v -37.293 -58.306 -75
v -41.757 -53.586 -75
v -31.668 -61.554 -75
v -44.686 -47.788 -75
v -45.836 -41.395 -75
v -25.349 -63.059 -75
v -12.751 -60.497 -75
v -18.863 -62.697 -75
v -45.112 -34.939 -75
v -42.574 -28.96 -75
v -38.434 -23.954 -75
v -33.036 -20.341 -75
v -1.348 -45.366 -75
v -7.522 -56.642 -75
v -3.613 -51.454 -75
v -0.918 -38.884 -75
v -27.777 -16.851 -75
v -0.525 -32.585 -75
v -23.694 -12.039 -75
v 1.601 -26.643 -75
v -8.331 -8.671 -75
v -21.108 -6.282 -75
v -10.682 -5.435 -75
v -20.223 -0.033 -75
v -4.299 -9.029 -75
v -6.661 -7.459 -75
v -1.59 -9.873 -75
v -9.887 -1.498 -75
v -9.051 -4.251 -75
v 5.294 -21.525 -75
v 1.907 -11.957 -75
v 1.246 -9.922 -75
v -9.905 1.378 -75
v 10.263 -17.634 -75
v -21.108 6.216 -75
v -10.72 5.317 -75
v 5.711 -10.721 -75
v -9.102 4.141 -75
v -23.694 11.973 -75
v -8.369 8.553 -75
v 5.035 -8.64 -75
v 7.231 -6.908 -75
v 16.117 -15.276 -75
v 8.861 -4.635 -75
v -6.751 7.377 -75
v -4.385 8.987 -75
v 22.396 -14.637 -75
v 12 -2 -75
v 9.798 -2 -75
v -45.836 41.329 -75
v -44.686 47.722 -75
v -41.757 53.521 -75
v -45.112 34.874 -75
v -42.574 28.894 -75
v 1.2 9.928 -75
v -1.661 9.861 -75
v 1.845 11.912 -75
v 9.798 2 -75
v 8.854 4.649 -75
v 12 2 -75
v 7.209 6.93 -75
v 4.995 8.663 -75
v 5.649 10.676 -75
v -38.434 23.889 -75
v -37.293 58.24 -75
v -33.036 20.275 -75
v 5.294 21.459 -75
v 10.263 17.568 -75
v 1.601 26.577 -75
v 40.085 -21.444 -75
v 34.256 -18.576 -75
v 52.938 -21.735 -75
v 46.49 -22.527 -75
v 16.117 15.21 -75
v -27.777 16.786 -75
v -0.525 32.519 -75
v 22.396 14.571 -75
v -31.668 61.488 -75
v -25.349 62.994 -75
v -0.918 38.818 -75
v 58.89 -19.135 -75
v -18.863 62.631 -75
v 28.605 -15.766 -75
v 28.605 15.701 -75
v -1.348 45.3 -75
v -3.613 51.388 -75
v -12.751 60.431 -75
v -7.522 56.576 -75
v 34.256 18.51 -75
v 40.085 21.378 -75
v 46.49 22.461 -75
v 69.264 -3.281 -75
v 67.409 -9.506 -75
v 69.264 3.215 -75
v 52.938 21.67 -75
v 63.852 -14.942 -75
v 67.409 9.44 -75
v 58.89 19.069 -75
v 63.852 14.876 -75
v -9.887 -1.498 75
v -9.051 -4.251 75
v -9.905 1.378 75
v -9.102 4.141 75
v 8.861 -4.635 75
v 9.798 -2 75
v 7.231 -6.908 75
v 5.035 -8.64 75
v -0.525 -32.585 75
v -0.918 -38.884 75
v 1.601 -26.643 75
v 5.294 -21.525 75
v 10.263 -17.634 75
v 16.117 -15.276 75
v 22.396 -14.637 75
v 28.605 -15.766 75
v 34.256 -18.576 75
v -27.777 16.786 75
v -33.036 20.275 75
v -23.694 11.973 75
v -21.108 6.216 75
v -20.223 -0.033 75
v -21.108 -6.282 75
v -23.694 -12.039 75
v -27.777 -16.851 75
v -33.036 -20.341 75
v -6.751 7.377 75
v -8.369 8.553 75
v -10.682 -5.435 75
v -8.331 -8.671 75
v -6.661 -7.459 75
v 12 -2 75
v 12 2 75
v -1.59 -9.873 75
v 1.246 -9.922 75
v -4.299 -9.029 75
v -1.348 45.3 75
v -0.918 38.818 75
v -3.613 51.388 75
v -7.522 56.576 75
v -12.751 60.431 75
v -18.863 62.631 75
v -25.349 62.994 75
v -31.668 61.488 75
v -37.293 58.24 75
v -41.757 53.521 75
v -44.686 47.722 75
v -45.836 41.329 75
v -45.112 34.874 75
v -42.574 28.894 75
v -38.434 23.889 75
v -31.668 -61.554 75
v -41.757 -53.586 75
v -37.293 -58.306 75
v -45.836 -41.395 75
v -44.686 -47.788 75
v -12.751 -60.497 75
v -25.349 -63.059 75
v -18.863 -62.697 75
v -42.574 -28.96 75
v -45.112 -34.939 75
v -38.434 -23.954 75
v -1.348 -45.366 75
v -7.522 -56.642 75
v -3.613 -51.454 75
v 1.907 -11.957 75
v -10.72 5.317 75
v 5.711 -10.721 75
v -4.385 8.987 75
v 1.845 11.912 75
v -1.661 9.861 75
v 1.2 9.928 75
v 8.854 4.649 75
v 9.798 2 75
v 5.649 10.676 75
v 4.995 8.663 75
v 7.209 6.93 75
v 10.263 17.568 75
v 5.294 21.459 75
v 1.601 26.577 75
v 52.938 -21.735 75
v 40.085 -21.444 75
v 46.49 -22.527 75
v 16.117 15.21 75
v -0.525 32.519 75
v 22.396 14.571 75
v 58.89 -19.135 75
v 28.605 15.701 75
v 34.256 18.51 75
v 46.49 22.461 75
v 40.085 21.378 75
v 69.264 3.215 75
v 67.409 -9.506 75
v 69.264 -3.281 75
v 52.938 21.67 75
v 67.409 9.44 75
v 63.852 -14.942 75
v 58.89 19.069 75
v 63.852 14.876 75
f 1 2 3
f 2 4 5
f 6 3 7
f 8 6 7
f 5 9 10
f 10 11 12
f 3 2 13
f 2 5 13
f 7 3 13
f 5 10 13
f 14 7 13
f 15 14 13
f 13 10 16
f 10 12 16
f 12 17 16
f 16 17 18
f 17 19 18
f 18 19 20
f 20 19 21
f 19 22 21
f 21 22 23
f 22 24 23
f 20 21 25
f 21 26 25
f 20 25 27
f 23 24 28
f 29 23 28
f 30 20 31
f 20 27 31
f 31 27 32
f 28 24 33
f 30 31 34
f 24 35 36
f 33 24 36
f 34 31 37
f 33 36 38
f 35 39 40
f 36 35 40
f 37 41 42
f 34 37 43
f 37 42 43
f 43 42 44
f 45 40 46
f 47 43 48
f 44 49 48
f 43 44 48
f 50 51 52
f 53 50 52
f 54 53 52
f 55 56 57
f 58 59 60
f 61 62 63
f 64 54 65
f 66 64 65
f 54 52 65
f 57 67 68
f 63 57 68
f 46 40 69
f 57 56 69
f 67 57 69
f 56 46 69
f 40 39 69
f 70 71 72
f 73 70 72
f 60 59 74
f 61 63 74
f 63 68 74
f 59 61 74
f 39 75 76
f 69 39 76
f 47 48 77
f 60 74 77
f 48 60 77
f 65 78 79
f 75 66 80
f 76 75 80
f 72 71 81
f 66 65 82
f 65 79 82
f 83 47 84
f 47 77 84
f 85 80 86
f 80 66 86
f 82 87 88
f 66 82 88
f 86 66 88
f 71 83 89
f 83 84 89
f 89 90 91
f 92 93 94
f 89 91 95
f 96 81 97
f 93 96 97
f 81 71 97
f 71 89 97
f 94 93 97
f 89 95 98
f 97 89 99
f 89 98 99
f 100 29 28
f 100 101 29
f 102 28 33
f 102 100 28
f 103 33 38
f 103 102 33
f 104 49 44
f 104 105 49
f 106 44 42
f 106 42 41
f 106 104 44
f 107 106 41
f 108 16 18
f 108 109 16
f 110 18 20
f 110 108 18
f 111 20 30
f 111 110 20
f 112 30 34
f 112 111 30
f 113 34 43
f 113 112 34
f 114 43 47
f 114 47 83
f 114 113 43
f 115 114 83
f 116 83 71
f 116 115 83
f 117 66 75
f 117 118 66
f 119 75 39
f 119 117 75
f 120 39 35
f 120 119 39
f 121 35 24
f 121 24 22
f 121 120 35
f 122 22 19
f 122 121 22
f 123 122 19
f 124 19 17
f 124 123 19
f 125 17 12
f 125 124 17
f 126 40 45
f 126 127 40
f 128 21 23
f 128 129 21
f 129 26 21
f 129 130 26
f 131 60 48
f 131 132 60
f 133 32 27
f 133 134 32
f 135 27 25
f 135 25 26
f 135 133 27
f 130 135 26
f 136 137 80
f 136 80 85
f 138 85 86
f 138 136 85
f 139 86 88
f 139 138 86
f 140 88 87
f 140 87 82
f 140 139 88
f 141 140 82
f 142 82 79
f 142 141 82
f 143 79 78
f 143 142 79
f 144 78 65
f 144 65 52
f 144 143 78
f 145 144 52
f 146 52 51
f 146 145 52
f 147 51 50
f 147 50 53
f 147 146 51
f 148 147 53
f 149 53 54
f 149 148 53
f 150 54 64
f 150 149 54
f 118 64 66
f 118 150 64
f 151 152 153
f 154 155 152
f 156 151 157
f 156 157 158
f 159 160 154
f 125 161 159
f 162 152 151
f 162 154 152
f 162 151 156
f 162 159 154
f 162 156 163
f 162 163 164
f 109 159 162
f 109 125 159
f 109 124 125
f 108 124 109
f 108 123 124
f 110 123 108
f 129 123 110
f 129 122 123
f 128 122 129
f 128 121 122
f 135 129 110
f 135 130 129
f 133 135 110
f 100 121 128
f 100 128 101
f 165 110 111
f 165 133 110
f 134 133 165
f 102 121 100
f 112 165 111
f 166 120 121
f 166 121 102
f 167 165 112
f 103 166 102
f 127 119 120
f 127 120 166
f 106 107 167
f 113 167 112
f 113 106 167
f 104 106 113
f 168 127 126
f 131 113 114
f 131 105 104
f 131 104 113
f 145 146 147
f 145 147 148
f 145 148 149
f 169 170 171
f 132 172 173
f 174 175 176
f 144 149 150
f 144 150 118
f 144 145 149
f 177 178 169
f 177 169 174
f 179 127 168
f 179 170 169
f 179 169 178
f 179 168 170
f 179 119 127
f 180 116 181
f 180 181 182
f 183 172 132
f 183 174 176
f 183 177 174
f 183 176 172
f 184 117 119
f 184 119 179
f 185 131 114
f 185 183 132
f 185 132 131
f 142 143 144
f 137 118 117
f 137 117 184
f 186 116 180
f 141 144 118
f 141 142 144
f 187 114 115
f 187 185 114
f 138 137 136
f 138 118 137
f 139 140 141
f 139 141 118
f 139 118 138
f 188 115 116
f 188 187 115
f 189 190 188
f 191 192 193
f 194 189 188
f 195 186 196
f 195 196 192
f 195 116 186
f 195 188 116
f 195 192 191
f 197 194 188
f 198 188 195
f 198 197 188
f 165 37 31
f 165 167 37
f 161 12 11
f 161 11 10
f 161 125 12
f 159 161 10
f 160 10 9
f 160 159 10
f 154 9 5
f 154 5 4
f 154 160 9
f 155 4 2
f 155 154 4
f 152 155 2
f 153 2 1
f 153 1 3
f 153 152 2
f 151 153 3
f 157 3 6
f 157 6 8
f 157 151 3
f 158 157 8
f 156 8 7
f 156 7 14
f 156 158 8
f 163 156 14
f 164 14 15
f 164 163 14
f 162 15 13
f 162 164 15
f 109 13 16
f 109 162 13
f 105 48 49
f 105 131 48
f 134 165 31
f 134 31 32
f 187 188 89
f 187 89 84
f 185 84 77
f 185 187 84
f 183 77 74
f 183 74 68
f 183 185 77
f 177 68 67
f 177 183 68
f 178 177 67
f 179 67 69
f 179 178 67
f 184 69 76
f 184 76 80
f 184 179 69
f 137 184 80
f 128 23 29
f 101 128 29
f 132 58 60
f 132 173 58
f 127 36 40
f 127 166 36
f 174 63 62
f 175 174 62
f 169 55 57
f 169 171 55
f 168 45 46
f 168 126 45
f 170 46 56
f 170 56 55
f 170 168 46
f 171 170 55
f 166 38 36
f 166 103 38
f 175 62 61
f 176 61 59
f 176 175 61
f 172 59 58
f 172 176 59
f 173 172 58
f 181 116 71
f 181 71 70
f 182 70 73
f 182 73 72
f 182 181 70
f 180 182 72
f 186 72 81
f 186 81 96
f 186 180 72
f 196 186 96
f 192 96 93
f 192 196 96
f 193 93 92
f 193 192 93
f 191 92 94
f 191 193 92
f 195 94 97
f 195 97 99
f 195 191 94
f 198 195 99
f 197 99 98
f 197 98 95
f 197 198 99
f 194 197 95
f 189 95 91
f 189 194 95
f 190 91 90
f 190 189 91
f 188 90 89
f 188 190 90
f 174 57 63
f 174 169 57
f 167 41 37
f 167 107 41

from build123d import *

# Parameters (mm, degrees)
BOSS_EXTRUDE1_DEPTH = 75


with BuildPart() as part:
    # Sketch1 → Boss-Extrude1 (new, symmetric)
    with BuildSketch(Plane.XY):
        with BuildLine():
            ThreePointArc((-0.917765177, -38.883932695), (10.262933143, -17.63377253), (34.256460841, -18.576083835))
            ThreePointArc((34.256460841, -18.576083835), (69.499988538, -0.032823555), (34.256460841, 18.510436725))
            ThreePointArc((34.256460841, 18.510436725), (10.262933143, 17.568125421), (-0.917765177, 38.818285585))
            ThreePointArc((-0.917765177, 38.818285585), (-34.598463498, 60.06844575), (-33.035634121, 20.275025305))
            ThreePointArc((-33.035634121, 20.275025305), (-20.222804743, -0.032823555), (-33.035634121, -20.340672415))
            ThreePointArc((-33.035634121, -20.340672415), (-34.598463498, -60.13409286), (-0.917765177, -38.883932695))
        make_face()
        with BuildLine():
            Line((1.907111414, -11.957316484), (1.245826983, -9.922092276))
            ThreePointArc((1.245826983, -9.922092276), (-2.974669232, -9.547321245), (-6.661121842, -7.458515657))
            Line((-6.661121842, -7.458515657), (-8.330592399, -8.671457016))
            Line((-8.330592399, -8.671457016), (-10.681733408, -5.435389039))
            Line((-10.681733408, -5.435389039), (-9.051488804, -4.250947003))
            ThreePointArc((-9.051488804, -4.250947003), (-9.99981681, -0.060529116), (-9.102285822, 4.141061797))
            Line((-9.102285822, 4.141061797), (-10.720319811, 5.316632302))
            Line((-10.720319811, 5.316632302), (-8.369178802, 8.552700279))
            Line((-8.369178802, 8.552700279), (-6.751144813, 7.377129775))
            ThreePointArc((-6.751144813, 7.377129775), (-3.054553816, 9.522063904), (1.199967545, 9.92774284))
            Line((1.199967545, 9.92774284), (1.844677303, 11.911955447))
            Line((1.844677303, 11.911955447), (5.648903368, 10.67588747))
            Line((5.648903368, 10.67588747), (4.994934057, 8.663176887))
            ThreePointArc((4.994934057, 8.663176887), (8.112145375, 5.847486418), (9.797958971, 2))
            Line((9.797958971, 2), (12, 2))
            Line((12, 2), (12, -2))
            Line((12, -2), (9.797958971, -2))
            ThreePointArc((9.797958971, -2), (8.125687266, -5.828653915), (5.035070067, -8.639911424))
            Line((5.035070067, -8.639911424), (5.71133748, -10.721248507))
            Line((5.71133748, -10.721248507), (1.907111414, -11.957316484))
        make_face(mode=Mode.SUBTRACT)
    extrude(amount=BOSS_EXTRUDE1_DEPTH, both=True)


solid = part.part
